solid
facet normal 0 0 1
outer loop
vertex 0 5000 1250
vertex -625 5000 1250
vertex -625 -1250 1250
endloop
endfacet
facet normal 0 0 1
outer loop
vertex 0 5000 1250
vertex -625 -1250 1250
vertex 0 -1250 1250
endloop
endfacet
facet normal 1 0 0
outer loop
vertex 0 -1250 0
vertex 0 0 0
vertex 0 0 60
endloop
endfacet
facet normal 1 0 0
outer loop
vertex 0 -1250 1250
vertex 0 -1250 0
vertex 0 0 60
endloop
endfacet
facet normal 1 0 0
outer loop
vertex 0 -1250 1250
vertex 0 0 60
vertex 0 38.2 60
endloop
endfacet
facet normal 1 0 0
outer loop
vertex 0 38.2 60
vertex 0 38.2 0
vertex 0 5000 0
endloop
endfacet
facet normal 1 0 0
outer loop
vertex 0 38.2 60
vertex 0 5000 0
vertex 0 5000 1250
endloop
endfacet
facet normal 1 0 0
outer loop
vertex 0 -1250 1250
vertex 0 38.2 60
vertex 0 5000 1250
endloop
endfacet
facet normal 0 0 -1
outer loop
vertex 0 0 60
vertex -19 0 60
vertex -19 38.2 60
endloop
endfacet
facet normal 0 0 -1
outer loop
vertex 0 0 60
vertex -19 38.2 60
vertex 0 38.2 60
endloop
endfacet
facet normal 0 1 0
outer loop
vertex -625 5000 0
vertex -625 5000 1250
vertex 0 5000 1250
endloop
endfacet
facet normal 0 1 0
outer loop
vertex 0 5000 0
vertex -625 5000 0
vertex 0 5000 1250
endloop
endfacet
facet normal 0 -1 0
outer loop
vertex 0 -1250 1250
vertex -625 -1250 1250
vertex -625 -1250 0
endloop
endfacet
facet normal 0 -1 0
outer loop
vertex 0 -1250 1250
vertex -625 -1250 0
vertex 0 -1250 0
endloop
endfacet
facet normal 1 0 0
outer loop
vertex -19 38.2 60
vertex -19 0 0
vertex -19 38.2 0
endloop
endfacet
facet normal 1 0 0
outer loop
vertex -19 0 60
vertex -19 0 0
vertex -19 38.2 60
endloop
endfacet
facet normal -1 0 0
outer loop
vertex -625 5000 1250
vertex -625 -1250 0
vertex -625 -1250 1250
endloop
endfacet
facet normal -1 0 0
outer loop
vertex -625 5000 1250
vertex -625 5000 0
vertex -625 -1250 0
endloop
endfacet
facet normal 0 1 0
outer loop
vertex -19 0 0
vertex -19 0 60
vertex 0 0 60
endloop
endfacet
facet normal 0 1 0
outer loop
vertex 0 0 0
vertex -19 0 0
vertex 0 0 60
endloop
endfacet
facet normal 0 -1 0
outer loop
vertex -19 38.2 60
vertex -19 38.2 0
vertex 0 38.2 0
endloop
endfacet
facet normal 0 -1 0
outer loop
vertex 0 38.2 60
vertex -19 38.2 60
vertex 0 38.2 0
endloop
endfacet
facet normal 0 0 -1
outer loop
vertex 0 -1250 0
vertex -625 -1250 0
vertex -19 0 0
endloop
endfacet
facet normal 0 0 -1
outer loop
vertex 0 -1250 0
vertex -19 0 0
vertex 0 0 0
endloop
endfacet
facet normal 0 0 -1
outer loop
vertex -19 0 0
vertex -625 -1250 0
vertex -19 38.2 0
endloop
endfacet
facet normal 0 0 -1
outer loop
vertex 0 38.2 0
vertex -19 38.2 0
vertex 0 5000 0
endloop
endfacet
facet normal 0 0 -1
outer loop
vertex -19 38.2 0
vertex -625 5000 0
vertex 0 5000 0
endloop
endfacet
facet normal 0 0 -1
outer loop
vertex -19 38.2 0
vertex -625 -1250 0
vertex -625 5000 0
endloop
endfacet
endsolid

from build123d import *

# Parameters (mm, degrees)
F0_W     = 625
F0_H     = 1250
F1_DEPTH = 5000
F2_W     = 19
F2_H     = 60
F3_DEPTH = 38.2
F4_DEPTH = 1250


with BuildPart() as f1:
    # F0 (on Front) → F1 (new body)
    with BuildSketch(Plane.XZ):
        with Locations((-312.5, 625)):
            Rectangle(F0_W, F0_H)
    extrude(amount=-F1_DEPTH)

    # F2 (on Front) → F3 (cut)
    with BuildSketch(Plane.XZ):
        with Locations((-9.5, 30)):
            Rectangle(F2_W, F2_H)
    extrude(amount=-F3_DEPTH, mode=Mode.SUBTRACT)

    # F0 (on Front) → F4 (join)
    with BuildSketch(Plane.XZ):
        with Locations((-312.5, 625)):
            Rectangle(F0_W, F0_H)
    extrude(amount=F4_DEPTH)


solid = f1.part
